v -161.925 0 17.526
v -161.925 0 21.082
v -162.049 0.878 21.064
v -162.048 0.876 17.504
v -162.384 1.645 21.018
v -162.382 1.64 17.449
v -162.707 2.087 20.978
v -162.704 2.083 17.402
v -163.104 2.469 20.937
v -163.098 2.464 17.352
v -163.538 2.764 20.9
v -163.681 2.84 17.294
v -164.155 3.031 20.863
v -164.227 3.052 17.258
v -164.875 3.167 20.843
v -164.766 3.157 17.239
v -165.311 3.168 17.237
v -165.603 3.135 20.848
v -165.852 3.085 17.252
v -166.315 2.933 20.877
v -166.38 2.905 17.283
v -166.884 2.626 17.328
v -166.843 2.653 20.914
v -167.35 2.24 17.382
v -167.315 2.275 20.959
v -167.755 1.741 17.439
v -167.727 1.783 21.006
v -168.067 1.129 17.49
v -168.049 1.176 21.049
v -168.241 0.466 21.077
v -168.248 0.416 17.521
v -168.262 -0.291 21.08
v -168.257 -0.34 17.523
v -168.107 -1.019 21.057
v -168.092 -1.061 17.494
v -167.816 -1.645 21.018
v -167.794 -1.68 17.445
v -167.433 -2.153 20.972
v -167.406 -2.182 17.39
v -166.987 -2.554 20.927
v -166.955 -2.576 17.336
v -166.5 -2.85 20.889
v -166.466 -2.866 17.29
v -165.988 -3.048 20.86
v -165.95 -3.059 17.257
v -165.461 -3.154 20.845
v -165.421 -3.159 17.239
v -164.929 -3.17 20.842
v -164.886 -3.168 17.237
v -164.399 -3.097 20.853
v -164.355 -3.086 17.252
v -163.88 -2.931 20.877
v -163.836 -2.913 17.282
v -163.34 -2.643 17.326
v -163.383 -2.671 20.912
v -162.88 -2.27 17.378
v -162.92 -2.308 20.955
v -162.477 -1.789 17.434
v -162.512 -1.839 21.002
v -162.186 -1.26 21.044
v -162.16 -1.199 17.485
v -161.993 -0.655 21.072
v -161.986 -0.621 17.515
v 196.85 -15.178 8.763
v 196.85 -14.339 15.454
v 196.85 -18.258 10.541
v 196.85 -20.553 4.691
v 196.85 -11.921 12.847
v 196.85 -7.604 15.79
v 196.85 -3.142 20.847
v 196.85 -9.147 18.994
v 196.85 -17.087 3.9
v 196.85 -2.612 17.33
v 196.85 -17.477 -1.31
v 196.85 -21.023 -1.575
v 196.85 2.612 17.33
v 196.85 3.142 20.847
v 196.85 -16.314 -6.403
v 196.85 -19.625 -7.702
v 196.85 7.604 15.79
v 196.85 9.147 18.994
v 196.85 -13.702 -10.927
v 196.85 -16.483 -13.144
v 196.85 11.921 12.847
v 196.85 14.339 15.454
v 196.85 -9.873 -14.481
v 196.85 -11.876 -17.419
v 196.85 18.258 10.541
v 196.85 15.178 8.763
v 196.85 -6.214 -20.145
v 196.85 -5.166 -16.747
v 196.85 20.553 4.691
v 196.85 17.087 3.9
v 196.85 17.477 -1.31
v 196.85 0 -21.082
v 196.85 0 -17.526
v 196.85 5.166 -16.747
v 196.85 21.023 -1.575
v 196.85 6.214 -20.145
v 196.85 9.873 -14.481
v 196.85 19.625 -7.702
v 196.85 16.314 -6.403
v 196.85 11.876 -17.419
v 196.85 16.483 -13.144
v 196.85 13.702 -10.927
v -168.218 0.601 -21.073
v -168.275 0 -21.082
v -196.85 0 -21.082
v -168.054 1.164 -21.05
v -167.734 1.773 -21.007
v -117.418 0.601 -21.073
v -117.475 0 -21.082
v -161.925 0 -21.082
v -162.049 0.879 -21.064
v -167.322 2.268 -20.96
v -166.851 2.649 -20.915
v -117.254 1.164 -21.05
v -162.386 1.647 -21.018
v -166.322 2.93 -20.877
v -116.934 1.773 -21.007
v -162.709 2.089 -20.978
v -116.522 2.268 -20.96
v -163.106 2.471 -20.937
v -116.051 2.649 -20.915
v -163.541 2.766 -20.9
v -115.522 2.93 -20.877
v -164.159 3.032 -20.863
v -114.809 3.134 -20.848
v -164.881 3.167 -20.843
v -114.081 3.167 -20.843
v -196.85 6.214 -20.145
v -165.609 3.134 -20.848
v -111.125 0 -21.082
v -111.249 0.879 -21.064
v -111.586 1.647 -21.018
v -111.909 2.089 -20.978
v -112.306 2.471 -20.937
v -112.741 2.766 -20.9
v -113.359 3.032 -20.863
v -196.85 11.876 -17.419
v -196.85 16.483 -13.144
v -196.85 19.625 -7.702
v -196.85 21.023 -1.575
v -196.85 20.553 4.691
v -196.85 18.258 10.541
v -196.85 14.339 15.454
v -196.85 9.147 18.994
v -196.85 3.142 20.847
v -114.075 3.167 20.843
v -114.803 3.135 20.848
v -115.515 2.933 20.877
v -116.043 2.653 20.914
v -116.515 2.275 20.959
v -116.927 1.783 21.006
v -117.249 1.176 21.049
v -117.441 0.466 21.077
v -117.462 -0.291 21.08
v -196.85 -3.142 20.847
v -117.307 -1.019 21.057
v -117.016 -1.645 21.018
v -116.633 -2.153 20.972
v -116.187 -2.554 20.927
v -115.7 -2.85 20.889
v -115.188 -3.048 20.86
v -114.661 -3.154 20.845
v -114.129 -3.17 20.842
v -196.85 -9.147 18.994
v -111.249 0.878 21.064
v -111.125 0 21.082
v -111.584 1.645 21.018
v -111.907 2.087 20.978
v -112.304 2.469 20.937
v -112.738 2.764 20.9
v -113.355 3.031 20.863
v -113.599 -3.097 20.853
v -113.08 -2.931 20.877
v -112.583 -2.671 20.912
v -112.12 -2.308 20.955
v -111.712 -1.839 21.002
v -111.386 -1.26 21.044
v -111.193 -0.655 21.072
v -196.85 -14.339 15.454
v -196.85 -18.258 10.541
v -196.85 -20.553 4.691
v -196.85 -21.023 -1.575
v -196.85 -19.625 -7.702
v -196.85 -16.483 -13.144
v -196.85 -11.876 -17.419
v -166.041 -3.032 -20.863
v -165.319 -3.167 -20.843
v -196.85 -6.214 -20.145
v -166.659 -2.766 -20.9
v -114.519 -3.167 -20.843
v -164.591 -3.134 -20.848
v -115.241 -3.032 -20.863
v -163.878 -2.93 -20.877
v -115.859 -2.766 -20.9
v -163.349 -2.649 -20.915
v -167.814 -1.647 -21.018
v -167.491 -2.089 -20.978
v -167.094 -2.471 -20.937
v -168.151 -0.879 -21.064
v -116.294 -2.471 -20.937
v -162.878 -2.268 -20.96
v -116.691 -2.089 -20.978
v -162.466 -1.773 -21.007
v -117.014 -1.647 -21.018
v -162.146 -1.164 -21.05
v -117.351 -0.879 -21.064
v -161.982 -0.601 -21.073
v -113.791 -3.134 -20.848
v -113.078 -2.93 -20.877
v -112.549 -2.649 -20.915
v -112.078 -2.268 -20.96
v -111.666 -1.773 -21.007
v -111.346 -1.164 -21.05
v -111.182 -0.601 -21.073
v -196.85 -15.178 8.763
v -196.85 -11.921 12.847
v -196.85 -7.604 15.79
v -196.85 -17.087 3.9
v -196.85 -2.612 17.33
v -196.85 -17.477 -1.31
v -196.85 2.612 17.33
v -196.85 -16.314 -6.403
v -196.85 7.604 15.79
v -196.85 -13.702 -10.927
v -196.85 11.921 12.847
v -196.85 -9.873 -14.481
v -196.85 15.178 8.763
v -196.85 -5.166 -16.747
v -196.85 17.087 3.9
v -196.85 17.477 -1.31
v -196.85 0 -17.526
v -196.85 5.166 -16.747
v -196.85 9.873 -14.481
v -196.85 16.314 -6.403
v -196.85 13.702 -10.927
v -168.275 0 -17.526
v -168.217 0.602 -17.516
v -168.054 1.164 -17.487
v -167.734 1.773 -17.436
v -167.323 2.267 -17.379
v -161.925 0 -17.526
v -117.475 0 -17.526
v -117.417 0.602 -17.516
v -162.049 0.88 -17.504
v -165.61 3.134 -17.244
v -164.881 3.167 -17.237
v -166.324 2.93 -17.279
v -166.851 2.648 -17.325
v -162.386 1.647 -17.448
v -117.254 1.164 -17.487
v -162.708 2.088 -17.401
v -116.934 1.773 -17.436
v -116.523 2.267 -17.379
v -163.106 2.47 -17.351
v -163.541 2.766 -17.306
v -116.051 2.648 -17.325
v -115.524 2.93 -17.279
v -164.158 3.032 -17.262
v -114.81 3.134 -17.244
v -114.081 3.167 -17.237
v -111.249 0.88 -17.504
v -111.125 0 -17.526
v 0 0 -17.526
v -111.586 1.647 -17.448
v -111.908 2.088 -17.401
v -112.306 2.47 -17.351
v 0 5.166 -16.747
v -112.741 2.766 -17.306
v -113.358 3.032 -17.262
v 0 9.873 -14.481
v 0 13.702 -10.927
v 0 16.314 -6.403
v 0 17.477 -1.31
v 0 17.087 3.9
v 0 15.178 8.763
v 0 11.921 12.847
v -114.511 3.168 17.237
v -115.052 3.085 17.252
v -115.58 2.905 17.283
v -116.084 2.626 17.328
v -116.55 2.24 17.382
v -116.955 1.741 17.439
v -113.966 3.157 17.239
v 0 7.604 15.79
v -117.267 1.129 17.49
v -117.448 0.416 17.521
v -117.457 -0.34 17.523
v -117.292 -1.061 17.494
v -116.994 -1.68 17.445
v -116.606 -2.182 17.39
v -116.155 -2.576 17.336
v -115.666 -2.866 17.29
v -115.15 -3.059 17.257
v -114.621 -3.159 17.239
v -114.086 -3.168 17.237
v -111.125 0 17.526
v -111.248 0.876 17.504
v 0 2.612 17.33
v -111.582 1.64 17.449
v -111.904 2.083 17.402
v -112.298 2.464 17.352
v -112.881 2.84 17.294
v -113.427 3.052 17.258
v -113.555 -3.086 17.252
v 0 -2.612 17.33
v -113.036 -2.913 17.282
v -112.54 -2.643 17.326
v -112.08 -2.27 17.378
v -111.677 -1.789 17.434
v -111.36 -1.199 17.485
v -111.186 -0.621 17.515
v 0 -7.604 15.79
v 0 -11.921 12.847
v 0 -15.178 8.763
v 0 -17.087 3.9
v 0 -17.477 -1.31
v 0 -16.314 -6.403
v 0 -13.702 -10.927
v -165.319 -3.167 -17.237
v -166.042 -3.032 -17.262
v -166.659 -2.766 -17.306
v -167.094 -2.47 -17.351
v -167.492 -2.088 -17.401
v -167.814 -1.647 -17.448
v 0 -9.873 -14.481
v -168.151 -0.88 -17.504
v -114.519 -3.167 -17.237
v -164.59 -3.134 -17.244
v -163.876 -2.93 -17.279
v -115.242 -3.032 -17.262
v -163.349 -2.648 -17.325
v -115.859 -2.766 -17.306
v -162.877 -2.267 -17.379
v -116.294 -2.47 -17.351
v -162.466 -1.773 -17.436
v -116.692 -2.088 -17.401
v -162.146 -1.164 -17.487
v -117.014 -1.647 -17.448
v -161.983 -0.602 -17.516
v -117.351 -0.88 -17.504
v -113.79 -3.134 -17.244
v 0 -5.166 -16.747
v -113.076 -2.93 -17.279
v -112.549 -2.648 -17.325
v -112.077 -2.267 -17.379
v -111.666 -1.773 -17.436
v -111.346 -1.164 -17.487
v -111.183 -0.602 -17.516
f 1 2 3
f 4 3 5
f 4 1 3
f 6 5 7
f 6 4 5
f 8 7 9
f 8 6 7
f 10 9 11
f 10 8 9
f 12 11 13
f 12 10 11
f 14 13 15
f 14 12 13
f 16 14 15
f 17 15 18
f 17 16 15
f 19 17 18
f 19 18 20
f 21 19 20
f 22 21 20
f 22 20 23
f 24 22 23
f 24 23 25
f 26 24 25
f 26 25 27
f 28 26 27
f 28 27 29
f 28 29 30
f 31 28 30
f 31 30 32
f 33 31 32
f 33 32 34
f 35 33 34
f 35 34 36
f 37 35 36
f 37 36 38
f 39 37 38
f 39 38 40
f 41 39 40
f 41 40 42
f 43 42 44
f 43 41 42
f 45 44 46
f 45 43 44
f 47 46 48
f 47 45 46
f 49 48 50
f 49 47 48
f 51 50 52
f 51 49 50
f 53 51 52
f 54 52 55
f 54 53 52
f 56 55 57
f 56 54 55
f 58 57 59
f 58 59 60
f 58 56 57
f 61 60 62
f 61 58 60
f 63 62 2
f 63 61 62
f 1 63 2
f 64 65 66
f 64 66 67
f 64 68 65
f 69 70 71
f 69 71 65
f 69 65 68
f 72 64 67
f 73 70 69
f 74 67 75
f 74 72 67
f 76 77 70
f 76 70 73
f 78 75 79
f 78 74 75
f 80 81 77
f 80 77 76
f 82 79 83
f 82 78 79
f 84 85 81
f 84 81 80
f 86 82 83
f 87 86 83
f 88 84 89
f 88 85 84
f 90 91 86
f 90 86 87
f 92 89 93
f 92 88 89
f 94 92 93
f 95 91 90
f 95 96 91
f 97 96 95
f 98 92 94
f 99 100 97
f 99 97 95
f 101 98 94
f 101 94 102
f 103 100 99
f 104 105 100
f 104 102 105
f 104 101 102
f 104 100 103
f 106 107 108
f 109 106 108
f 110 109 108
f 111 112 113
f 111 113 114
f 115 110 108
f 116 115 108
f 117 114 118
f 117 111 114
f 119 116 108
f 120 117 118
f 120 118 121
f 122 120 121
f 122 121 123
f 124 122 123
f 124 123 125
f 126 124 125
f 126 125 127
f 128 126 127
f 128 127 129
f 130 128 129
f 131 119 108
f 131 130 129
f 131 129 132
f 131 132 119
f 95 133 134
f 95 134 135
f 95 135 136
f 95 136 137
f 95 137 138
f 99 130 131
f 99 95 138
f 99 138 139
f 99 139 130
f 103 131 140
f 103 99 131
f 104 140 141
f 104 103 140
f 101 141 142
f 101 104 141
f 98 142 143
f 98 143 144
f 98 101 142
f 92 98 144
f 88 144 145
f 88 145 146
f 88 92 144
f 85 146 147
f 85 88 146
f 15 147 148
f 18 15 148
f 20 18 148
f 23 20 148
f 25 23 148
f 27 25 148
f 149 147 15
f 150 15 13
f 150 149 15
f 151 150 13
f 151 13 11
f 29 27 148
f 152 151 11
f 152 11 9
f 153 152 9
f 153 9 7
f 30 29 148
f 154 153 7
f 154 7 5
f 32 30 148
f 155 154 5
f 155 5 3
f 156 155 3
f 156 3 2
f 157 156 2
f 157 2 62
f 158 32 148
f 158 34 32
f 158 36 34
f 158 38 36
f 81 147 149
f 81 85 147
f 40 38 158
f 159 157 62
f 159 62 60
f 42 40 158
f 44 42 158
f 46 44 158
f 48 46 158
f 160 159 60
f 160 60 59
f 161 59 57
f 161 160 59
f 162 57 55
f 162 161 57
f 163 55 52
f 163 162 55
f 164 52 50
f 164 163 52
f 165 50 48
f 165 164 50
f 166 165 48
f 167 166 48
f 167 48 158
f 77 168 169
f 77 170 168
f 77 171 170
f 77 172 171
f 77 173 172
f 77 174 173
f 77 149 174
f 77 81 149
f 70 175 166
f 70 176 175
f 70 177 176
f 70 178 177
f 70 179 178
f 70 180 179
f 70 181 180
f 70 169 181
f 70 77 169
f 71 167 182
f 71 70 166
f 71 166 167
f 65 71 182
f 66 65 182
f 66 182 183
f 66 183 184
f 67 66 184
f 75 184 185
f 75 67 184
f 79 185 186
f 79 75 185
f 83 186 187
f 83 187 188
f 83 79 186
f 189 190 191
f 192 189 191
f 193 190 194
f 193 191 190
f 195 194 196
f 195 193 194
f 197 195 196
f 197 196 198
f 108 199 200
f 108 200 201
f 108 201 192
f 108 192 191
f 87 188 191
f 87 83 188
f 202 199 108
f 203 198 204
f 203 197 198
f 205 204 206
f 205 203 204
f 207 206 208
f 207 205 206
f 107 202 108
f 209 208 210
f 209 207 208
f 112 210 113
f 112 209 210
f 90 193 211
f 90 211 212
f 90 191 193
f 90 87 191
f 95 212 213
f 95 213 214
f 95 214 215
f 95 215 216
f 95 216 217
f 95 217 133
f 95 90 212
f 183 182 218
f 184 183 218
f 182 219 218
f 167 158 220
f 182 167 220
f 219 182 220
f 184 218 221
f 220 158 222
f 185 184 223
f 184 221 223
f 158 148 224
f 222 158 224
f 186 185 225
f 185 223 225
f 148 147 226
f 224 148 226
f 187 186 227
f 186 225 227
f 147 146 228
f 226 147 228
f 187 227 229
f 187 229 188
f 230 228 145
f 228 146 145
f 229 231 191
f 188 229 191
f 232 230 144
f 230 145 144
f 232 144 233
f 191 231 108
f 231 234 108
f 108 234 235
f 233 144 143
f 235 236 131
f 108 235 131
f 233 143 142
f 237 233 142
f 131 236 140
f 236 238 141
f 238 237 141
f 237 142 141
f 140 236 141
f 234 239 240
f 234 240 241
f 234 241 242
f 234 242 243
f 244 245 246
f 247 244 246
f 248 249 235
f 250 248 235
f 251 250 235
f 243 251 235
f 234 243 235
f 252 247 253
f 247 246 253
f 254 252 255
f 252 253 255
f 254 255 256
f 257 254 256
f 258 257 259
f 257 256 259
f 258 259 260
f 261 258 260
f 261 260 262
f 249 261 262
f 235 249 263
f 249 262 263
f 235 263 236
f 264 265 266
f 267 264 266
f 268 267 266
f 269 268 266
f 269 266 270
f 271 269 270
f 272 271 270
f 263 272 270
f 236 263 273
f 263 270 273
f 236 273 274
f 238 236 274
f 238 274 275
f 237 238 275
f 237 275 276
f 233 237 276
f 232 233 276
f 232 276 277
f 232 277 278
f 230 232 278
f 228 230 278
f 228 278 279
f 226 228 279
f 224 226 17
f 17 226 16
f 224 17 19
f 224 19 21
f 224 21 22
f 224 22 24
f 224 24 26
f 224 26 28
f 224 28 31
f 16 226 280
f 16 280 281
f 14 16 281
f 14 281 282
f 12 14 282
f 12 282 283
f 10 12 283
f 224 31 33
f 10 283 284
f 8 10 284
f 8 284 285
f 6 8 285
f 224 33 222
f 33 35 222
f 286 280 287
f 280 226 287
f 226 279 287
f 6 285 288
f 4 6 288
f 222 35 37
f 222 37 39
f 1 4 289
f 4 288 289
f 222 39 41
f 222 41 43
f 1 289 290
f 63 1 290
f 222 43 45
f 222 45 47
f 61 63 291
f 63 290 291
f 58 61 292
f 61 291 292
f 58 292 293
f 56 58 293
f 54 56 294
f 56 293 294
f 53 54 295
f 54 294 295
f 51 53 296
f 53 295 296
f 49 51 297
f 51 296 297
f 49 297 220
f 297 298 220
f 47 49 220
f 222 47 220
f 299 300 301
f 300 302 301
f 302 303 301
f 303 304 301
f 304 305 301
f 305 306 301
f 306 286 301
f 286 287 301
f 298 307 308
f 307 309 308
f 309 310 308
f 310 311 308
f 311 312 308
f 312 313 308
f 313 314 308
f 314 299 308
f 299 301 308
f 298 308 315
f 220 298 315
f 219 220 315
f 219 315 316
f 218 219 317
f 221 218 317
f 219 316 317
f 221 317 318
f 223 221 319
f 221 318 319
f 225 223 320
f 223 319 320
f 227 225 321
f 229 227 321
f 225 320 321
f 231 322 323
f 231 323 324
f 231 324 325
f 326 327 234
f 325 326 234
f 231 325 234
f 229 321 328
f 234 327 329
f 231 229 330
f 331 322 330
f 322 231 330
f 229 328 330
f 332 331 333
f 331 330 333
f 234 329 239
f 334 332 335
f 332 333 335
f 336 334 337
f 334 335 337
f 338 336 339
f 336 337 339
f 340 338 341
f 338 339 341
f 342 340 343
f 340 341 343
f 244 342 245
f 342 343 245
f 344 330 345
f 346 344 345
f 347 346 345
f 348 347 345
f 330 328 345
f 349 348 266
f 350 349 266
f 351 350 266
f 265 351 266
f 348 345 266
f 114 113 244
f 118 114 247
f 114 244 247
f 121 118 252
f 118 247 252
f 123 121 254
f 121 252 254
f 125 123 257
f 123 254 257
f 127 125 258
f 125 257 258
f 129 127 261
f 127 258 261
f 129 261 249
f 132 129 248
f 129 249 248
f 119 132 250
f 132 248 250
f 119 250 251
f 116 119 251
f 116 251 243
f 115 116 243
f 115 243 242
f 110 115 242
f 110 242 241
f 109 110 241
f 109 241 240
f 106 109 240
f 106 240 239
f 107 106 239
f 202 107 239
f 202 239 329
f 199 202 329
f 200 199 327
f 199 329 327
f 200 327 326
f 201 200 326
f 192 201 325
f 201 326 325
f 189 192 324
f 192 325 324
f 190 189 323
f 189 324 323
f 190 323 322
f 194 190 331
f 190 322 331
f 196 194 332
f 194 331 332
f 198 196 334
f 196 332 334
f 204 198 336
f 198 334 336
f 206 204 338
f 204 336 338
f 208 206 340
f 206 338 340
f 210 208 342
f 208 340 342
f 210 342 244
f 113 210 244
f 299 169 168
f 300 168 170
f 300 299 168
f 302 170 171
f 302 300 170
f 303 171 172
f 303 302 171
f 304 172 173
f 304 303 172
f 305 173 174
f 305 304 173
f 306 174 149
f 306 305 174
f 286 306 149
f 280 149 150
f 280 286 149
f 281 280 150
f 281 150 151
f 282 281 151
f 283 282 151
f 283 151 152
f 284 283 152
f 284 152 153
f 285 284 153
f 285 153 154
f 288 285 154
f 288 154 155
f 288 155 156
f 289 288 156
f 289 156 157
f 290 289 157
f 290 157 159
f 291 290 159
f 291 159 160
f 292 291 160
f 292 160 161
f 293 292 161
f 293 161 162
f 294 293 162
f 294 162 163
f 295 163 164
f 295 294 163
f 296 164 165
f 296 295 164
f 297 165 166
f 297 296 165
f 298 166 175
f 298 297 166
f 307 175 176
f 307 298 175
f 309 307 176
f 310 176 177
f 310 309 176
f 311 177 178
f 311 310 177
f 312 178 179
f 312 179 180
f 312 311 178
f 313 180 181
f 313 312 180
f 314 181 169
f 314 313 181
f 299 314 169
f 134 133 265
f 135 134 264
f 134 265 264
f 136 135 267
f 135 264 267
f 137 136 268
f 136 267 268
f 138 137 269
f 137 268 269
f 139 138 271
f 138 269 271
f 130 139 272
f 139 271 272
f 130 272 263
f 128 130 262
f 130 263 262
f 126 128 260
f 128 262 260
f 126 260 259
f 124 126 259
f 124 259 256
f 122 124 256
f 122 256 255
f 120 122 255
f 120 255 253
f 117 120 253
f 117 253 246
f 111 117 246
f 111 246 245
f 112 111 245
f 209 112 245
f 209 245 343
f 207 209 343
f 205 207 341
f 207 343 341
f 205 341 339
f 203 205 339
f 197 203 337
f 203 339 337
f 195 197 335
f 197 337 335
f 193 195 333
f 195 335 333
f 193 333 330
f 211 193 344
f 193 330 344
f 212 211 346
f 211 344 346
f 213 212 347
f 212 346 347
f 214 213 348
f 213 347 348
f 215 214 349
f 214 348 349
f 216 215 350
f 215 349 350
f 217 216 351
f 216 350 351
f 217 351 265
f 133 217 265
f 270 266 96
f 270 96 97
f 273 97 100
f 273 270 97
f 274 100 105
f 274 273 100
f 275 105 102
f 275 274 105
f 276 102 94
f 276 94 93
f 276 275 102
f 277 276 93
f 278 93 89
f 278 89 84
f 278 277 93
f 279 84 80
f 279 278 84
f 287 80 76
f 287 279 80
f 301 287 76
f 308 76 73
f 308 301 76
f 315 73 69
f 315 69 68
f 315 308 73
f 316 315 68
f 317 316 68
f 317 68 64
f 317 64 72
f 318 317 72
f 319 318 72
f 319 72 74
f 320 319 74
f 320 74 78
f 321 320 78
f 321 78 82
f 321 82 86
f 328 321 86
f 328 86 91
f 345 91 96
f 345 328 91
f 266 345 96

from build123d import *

# Parameters (mm, degrees)
SKETCH1_R                = 21.082
SKETCH1_R_2              = 17.526
BOSS_EXTRUDE1_DEPTH      = 196.85
BOSS_EXTRUDE1_DEPTH_BACK = 196.85
SKETCH2_R                = 3.175
CUT_EXTRUDE1_DEPTH       = 22.082
CUT_EXTRUDE1_DEPTH_BACK  = 22.082


with BuildPart() as part:
    # Sketch1 → Boss-Extrude1 (new body, two sides)
    with BuildSketch(Plane(origin=(0, 0, 0), x_dir=(0, 0, -1), z_dir=(1, 0, 0))) as boss_extrude1_sk:
        Circle(SKETCH1_R)
        Circle(SKETCH1_R_2, mode=Mode.SUBTRACT)
    extrude(amount=BOSS_EXTRUDE1_DEPTH)
    extrude(boss_extrude1_sk.sketch, amount=-BOSS_EXTRUDE1_DEPTH_BACK)

    # Sketch2 → Cut-Extrude1 (cut, two sides)
    with BuildSketch(Plane.XY) as cut_extrude1_sk:
        with Locations((-114.3, 0)):
            Circle(SKETCH2_R)
        with Locations((-165.1, 0)):
            Circle(SKETCH2_R)
    extrude(amount=CUT_EXTRUDE1_DEPTH, mode=Mode.SUBTRACT)
    extrude(cut_extrude1_sk.sketch, amount=-CUT_EXTRUDE1_DEPTH_BACK, mode=Mode.SUBTRACT)


solid = part.part
